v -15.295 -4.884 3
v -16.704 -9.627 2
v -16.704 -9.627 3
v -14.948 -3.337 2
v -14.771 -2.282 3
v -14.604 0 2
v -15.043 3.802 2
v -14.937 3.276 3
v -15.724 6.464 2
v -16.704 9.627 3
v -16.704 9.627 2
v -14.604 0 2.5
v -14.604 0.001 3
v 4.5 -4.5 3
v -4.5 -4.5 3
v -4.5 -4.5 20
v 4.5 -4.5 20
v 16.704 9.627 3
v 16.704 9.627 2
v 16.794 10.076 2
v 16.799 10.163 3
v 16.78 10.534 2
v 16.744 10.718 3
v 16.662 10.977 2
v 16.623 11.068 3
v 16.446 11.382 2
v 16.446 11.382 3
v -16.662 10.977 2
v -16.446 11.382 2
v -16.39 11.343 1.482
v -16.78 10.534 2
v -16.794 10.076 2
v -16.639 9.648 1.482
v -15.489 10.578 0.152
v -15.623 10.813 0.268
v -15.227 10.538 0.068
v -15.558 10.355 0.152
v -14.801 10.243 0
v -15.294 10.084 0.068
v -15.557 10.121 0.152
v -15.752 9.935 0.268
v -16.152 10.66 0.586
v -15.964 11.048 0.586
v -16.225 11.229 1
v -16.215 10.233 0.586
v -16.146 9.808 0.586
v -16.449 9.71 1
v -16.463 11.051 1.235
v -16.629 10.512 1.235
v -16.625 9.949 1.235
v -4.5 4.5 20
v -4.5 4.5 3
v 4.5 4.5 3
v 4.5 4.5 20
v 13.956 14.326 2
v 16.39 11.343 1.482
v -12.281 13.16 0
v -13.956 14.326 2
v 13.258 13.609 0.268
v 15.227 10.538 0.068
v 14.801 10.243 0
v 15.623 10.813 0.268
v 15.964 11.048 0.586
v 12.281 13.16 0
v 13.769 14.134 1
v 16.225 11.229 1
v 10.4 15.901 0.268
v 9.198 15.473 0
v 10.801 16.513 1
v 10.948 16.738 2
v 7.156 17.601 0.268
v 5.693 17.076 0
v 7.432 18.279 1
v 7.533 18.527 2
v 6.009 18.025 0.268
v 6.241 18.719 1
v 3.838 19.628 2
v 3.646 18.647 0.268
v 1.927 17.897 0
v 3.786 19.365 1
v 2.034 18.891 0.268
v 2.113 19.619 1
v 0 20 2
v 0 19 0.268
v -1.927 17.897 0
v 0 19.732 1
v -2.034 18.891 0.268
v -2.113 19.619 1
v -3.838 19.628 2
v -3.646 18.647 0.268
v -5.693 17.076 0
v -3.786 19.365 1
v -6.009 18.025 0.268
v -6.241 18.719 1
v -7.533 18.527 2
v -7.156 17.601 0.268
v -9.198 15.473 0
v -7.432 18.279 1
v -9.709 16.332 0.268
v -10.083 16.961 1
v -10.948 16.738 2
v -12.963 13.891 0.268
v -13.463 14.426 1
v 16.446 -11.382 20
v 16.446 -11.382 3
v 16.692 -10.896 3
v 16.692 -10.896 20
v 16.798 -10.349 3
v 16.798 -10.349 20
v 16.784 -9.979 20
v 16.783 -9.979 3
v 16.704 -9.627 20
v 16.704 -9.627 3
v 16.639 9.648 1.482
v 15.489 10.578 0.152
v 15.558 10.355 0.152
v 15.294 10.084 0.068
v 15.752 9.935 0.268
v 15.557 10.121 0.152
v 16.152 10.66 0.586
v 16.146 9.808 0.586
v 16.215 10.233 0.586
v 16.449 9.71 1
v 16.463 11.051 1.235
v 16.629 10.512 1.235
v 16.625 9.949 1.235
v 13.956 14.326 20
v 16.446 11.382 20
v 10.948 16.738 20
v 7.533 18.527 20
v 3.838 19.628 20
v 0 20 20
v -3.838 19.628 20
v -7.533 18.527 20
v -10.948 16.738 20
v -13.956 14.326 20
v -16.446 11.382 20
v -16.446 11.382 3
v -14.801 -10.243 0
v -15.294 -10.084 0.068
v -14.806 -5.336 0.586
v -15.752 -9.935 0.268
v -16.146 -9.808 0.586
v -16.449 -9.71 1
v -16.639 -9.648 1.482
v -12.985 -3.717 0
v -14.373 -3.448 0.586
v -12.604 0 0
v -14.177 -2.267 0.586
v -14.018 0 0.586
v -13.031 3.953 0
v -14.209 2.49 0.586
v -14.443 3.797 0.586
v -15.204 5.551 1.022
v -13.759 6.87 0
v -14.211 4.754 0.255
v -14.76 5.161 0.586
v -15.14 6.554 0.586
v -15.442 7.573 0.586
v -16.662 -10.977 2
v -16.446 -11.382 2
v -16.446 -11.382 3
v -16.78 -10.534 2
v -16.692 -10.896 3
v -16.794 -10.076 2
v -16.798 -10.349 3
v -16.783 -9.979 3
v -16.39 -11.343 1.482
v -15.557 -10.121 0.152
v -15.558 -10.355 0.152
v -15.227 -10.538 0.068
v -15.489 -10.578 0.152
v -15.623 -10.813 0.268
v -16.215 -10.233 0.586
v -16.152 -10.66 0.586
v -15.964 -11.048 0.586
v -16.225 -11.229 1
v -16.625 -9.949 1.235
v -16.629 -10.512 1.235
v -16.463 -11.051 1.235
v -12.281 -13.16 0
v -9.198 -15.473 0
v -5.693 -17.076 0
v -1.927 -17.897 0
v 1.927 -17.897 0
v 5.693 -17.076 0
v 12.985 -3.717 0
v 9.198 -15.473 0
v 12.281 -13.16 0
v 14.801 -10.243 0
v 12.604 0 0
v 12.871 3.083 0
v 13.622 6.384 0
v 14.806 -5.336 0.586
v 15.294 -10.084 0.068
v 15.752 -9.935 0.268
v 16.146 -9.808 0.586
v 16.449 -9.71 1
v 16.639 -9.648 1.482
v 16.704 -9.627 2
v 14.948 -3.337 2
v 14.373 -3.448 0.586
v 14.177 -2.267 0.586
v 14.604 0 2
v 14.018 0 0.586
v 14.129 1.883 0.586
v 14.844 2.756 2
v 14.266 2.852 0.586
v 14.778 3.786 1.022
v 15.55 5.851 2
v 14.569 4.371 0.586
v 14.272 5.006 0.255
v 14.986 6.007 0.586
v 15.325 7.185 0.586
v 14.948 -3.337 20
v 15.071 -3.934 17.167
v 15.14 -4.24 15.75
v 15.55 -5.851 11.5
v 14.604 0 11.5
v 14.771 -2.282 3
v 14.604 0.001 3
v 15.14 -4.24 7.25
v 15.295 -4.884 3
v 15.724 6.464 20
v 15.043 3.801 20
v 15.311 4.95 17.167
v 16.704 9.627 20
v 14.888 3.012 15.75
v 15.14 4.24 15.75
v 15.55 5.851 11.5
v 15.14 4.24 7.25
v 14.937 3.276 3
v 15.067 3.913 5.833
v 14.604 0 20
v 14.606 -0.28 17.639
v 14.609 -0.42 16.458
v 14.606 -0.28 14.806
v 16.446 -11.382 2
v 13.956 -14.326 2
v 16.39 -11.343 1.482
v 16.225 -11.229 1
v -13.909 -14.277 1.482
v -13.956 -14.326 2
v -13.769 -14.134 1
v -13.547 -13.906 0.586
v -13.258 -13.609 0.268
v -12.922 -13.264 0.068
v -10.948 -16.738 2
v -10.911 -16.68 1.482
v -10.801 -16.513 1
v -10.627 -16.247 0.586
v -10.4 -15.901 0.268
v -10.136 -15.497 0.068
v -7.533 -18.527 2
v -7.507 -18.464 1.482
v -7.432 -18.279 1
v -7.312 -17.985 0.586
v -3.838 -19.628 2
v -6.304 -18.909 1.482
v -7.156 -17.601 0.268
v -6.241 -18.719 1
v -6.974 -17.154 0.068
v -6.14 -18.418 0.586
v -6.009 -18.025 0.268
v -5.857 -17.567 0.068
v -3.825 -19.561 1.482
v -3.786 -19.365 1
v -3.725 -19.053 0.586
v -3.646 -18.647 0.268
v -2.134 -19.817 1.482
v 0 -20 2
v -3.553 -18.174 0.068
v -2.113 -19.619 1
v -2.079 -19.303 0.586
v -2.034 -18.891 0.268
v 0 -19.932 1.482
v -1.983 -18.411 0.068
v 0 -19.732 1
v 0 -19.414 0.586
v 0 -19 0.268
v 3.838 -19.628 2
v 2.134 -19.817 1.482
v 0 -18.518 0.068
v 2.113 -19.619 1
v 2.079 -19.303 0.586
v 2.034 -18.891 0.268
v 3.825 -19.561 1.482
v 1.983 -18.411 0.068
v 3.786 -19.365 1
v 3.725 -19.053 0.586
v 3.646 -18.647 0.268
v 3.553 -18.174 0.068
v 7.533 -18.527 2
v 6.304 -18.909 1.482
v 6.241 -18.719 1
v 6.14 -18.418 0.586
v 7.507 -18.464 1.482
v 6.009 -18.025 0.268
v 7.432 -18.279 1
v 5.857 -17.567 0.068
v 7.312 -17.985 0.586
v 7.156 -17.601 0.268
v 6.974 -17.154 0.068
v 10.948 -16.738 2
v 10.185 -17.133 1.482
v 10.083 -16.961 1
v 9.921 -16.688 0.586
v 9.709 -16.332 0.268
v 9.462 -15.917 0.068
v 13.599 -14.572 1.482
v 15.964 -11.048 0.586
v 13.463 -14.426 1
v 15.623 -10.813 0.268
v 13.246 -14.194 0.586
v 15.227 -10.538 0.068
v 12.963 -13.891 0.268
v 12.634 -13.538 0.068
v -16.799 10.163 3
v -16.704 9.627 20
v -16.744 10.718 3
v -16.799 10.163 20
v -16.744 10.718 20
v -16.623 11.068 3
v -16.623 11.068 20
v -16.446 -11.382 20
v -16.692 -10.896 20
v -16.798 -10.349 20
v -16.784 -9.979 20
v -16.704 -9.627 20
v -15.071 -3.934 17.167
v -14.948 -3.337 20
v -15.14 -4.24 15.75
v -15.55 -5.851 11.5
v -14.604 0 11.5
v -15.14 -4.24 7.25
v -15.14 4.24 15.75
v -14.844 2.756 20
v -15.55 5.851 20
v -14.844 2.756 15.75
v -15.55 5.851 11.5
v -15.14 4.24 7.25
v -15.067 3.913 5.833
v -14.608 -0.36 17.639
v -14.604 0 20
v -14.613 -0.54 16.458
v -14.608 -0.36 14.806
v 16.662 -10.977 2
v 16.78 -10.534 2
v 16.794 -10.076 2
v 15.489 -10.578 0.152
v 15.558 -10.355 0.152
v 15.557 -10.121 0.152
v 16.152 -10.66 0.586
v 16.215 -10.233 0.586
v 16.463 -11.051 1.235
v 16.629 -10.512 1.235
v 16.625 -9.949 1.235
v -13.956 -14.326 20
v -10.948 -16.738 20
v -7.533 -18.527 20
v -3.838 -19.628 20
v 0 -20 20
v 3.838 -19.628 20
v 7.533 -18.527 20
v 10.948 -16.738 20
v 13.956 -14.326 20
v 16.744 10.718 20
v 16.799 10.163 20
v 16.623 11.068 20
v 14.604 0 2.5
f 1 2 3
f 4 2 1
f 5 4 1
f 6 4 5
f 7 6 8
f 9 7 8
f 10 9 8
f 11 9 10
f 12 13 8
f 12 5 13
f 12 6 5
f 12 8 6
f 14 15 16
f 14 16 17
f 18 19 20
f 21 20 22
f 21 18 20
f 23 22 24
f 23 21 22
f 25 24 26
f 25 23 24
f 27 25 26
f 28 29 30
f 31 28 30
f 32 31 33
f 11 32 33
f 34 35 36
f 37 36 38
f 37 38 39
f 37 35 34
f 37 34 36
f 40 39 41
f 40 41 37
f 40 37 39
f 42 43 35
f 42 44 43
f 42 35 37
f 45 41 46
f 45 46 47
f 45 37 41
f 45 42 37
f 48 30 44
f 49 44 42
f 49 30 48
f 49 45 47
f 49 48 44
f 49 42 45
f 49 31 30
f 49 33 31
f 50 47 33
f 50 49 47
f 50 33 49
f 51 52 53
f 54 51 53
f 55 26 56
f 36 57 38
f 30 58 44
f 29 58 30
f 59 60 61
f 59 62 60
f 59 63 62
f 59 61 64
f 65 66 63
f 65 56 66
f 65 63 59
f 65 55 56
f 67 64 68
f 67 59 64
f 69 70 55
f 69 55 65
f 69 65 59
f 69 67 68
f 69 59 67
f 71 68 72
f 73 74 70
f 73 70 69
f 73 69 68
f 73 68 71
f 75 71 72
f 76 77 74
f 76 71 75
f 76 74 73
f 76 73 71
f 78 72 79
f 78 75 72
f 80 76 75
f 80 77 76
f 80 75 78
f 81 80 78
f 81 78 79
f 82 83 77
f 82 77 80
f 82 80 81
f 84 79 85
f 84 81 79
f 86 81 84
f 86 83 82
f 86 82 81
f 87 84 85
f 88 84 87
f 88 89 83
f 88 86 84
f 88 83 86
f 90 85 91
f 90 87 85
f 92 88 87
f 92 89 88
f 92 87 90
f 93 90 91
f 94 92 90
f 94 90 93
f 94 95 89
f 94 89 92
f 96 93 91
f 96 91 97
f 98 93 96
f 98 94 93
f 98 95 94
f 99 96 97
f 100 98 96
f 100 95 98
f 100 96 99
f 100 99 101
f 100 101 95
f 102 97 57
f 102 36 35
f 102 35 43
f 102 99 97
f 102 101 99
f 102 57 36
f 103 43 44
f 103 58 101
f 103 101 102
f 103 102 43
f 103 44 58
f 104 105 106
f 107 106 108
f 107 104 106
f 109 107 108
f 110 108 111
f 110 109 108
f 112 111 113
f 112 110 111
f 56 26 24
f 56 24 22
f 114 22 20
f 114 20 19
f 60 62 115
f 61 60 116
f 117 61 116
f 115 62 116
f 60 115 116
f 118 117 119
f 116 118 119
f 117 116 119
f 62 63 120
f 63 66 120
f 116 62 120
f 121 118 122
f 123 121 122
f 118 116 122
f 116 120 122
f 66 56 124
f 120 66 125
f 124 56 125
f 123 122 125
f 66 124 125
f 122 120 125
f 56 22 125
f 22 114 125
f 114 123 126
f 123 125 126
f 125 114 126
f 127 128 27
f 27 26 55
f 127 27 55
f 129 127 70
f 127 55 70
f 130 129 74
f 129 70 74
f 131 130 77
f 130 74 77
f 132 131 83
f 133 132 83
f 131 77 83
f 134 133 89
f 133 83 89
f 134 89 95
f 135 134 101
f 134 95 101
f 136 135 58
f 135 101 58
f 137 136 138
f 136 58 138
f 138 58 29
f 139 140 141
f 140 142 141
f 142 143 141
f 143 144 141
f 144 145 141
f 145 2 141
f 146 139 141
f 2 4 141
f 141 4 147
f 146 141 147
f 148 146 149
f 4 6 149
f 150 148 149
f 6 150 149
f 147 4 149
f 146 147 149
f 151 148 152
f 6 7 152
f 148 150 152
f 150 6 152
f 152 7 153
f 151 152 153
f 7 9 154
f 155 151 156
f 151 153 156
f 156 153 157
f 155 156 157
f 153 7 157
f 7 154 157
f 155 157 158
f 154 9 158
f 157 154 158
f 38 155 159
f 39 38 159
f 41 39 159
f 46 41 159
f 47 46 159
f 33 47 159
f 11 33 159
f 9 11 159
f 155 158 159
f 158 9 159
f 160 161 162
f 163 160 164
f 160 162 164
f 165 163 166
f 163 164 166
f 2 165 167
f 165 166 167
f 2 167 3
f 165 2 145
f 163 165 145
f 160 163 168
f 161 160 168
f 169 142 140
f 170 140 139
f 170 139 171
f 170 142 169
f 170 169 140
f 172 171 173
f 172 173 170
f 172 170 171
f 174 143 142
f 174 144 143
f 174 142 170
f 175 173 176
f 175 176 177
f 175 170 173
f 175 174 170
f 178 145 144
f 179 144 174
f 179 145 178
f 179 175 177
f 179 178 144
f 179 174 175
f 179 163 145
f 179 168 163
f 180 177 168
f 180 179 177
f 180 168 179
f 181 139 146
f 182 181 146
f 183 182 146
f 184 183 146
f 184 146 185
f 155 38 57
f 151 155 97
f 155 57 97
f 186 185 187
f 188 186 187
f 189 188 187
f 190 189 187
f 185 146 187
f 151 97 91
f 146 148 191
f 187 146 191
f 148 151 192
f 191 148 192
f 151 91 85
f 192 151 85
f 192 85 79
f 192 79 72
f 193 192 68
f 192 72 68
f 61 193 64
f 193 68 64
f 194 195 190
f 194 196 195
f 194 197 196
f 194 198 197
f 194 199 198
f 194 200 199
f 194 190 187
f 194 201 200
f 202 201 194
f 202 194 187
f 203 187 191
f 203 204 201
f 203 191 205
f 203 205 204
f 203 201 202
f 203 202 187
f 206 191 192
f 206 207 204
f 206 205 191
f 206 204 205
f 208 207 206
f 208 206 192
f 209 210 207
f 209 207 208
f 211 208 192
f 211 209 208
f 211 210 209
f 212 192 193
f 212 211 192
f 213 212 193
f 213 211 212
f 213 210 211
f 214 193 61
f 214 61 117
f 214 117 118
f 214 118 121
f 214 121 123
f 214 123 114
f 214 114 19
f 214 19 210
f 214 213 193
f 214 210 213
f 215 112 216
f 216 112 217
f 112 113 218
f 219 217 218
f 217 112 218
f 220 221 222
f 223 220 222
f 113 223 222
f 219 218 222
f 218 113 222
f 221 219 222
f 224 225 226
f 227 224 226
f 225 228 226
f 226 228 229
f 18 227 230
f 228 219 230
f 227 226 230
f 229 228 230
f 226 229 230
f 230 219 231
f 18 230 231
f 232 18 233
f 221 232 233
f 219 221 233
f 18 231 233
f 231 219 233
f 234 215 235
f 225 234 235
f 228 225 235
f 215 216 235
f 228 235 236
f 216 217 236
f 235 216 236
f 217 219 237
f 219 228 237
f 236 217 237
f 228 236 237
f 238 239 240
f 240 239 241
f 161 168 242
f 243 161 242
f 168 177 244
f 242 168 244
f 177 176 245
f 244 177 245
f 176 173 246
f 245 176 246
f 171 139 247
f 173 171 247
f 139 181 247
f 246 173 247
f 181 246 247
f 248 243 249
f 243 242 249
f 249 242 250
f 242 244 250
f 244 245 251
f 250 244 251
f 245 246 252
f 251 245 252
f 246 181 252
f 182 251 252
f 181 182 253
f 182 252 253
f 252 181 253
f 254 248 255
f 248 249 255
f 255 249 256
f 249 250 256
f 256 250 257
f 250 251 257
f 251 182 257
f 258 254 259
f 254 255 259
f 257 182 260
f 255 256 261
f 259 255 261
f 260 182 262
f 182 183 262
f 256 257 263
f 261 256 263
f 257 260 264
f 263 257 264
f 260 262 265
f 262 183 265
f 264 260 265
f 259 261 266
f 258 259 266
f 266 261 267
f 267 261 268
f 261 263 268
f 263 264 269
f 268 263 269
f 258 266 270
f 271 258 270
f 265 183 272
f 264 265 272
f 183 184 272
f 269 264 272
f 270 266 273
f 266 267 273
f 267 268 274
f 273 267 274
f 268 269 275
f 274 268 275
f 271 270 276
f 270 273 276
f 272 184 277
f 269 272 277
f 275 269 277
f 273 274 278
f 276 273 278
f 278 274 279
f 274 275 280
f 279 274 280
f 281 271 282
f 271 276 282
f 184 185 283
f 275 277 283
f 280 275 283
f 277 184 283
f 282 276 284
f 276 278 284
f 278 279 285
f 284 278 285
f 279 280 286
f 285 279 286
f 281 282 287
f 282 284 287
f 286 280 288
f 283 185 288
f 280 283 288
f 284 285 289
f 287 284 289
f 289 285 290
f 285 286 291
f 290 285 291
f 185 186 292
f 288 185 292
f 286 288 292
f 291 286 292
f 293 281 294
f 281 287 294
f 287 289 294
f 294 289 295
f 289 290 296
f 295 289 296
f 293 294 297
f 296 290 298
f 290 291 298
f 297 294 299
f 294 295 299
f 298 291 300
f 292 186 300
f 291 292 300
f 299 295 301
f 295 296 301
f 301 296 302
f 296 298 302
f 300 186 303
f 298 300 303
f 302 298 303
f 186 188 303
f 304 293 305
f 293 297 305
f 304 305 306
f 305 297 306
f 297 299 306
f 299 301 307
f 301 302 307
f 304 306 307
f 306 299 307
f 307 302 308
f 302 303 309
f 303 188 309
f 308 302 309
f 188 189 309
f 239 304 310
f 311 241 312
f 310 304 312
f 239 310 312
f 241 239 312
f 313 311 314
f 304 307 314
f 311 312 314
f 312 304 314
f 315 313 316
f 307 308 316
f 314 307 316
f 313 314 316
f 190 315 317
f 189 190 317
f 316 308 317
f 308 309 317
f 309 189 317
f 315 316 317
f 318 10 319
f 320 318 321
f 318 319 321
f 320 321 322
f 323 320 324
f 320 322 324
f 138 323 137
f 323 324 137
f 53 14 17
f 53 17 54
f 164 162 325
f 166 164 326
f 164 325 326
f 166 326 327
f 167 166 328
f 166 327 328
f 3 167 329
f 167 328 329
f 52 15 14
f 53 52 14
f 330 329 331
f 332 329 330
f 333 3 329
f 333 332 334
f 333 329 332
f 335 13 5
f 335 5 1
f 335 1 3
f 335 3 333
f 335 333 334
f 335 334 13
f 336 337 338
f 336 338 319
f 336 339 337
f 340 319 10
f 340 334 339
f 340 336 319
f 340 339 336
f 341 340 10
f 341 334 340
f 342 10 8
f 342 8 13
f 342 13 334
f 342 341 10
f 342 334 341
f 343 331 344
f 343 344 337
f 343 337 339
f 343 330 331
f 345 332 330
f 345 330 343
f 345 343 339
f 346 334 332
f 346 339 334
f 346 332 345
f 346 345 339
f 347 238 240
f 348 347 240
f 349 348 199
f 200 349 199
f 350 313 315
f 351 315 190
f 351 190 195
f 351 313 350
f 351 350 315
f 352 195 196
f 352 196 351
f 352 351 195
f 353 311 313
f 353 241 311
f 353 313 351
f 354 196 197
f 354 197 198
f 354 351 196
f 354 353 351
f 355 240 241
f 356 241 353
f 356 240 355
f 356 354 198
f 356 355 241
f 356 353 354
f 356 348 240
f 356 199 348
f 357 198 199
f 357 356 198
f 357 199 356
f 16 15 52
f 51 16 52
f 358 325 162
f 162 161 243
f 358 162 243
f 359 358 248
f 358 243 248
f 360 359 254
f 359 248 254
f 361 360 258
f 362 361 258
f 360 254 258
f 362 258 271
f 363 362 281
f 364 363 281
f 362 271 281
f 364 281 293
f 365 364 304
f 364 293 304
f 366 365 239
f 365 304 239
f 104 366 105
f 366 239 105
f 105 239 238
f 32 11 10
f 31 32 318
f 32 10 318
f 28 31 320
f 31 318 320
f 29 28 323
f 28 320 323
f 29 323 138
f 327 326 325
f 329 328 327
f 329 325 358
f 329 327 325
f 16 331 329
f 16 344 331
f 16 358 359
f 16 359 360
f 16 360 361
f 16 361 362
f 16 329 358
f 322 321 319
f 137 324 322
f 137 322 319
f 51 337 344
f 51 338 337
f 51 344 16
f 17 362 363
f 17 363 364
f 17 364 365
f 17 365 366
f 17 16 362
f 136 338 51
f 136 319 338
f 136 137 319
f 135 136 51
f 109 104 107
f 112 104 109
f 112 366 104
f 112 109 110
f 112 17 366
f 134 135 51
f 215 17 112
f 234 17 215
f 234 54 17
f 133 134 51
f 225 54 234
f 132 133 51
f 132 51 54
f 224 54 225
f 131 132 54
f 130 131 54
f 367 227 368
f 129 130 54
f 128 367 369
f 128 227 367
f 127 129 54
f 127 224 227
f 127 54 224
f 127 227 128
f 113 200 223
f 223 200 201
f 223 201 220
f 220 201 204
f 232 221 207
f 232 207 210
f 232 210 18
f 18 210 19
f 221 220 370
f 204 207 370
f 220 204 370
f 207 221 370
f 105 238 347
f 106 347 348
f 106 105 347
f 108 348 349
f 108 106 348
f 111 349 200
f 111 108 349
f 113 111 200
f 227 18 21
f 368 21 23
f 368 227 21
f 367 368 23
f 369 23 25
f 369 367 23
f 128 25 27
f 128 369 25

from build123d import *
from build123d import SkipClean  # not in build123d's __all__

# Parameters (mm, degrees)
F0_W     = 9
F0_H     = 9
F1_DEPTH = 3
F2_DEPTH = 20
F3_DEPTH = 25
F4_R     = 2


with BuildPart() as f1:
    # F0 (on Top) → F1 (new body)
    with BuildSketch(Plane.XY):
        with BuildLine():
            ThreePointArc((17, -10.5356537529), (19.2353840617, -5.4772255751), (20, 0))
            ThreePointArc((20, 0), (19.2353840617, 5.4772255751), (17, 10.5356537529))
            add(Edge.make_bspline(
                [(17, -10.5356537529), (15.4390588775, -5.7747014672), (13.767943494, 0), (15.4390588775, 5.7747014672), (17, 10.5356537529)],
                knots=[0, 0, 0, 0, 0.5, 1, 1, 1, 1], degree=3))
        make_face()
        with BuildLine():
            add(Edge.make_bspline(
                [(17, -10.5356537529), (15.4390588775, -5.7747014672), (13.767943494, 0), (15.4390588775, 5.7747014672), (17, 10.5356537529)],
                knots=[0, 0, 0, 0, 0.5, 1, 1, 1, 1], degree=3))
            ThreePointArc((17, 10.5356537529), (0, 20), (-17, 10.5356537529))
            add(Edge.make_bspline(
                [(-17, -10.5356537529), (-15.4390588775, -5.7747014672), (-13.767943494, 0), (-15.4390588775, 5.7747014672), (-17, 10.5356537529)],
                knots=[0, 0, 0, 0, 0.5, 1, 1, 1, 1], degree=3))
            ThreePointArc((-17, -10.5356537529), (0, -20), (17, -10.5356537529))
        make_face()
        Rectangle(F0_W, F0_H, mode=Mode.SUBTRACT)
        with BuildLine():
            add(Edge.make_bspline(
                [(-17, -10.5356537529), (-15.4390588775, -5.7747014672), (-13.767943494, 0), (-15.4390588775, 5.7747014672), (-17, 10.5356537529)],
                knots=[0, 0, 0, 0, 0.5, 1, 1, 1, 1], degree=3))
            ThreePointArc((-17, 10.5356537529), (-20, 0), (-17, -10.5356537529))
        make_face()
        Rectangle(F0_W, F0_H)
    extrude(amount=F1_DEPTH)

    # F0 (on Top) → F2 (join)
    with BuildSketch(Plane.XY):
        with BuildLine():
            add(Edge.make_bspline(
                [(17, -10.5356537529), (15.4390588775, -5.7747014672), (13.767943494, 0), (15.4390588775, 5.7747014672), (17, 10.5356537529)],
                knots=[0, 0, 0, 0, 0.5, 1, 1, 1, 1], degree=3))
            ThreePointArc((17, 10.5356537529), (0, 20), (-17, 10.5356537529))
            add(Edge.make_bspline(
                [(-17, -10.5356537529), (-15.4390588775, -5.7747014672), (-13.767943494, 0), (-15.4390588775, 5.7747014672), (-17, 10.5356537529)],
                knots=[0, 0, 0, 0, 0.5, 1, 1, 1, 1], degree=3))
            ThreePointArc((-17, -10.5356537529), (0, -20), (17, -10.5356537529))
        make_face()
        Rectangle(F0_W, F0_H, mode=Mode.SUBTRACT)
    with SkipClean():  # cleaning this boolean's faces spoils the solid; the shape is the same uncleaned
        extrude(amount=F2_DEPTH)

    # F0 (on Top) → F3 (cut)
    with BuildSketch(Plane.XY):
        with BuildLine():
            add(Edge.make_bspline(
                [(-17, -10.5356537529), (-15.4390588775, -5.7747014672), (-13.767943494, 0), (-15.4390588775, 5.7747014672), (-17, 10.5356537529)],
                knots=[0, 0, 0, 0, 0.5, 1, 1, 1, 1], degree=3))
            ThreePointArc((-17, 10.5356537529), (-20, 0), (-17, -10.5356537529))
        make_face()
        with BuildLine():
            ThreePointArc((17, -10.5356537529), (19.2353840617, -5.4772255751), (20, 0))
            ThreePointArc((20, 0), (19.2353840617, 5.4772255751), (17, 10.5356537529))
            add(Edge.make_bspline(
                [(17, -10.5356537529), (15.4390588775, -5.7747014672), (13.767943494, 0), (15.4390588775, 5.7747014672), (17, 10.5356537529)],
                knots=[0, 0, 0, 0, 0.5, 1, 1, 1, 1], degree=3))
        make_face()
    extrude(amount=F3_DEPTH, mode=Mode.SUBTRACT)

    # F4
    f4_edges = [f1.edges().sort_by_distance(p)[0] for p in [
        (0, 20, 0),
        (-14.603501, 0, 0),
        (0, -20, 0),
        (14.603501, 0, 0),
        (-17, 10.535654, 1.5),
        (-17, 10.535654, 11.5),
        (-17, -10.535654, 1.5),
        (-17, -10.535654, 11.5),
        (17, 10.535654, 1.5),
        (17, 10.535654, 11.5),
        (17, -10.535654, 11.5),
        (17, -10.535654, 1.5),
    ]]
    fillet(f4_edges, radius=F4_R)


solid = f1.part
